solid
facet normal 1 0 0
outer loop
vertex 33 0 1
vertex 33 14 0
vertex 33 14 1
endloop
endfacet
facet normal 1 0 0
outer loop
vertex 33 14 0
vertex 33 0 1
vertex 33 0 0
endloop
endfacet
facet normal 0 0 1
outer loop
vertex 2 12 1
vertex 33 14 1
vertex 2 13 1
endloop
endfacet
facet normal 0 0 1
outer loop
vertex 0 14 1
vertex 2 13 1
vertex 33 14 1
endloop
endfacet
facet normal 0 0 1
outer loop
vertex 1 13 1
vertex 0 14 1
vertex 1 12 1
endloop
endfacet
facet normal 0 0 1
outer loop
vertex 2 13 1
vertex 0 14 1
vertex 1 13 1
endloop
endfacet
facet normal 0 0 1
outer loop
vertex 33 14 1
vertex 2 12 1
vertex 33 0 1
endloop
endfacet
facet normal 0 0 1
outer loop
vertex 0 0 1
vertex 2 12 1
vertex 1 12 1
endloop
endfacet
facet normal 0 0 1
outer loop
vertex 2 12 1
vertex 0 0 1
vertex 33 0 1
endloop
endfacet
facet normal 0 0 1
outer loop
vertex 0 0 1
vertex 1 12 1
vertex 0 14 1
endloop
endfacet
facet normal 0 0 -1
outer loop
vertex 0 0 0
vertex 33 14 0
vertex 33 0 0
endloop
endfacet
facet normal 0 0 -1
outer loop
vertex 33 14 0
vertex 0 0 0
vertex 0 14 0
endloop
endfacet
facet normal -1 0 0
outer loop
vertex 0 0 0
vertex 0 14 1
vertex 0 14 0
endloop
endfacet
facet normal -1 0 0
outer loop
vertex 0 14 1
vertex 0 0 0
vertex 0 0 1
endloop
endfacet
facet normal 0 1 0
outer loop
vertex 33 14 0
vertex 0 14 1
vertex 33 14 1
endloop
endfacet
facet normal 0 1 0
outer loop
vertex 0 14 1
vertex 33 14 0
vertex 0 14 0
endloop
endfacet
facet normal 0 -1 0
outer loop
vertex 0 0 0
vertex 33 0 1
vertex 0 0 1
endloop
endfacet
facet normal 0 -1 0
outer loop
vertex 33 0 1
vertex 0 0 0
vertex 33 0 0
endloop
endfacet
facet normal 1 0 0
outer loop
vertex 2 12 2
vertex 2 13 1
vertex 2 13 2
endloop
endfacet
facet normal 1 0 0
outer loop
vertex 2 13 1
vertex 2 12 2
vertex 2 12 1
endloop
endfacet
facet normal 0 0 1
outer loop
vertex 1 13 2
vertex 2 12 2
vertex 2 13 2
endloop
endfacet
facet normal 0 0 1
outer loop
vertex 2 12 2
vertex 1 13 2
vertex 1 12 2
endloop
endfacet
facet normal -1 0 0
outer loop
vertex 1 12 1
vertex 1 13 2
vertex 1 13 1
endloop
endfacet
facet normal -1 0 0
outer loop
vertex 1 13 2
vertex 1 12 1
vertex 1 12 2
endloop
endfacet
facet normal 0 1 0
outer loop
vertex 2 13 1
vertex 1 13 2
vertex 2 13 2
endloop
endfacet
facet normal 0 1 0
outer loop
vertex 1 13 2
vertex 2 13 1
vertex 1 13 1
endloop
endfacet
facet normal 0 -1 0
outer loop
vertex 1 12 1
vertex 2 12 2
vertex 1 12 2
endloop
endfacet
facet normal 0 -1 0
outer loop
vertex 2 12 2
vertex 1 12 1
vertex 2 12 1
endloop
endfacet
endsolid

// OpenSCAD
cube([33,14,1]);
translate([1,12,1]) {
	cube([1,1,1]);
}



month = [1 : 12];
for (i = month) {
	echo(i);
}
